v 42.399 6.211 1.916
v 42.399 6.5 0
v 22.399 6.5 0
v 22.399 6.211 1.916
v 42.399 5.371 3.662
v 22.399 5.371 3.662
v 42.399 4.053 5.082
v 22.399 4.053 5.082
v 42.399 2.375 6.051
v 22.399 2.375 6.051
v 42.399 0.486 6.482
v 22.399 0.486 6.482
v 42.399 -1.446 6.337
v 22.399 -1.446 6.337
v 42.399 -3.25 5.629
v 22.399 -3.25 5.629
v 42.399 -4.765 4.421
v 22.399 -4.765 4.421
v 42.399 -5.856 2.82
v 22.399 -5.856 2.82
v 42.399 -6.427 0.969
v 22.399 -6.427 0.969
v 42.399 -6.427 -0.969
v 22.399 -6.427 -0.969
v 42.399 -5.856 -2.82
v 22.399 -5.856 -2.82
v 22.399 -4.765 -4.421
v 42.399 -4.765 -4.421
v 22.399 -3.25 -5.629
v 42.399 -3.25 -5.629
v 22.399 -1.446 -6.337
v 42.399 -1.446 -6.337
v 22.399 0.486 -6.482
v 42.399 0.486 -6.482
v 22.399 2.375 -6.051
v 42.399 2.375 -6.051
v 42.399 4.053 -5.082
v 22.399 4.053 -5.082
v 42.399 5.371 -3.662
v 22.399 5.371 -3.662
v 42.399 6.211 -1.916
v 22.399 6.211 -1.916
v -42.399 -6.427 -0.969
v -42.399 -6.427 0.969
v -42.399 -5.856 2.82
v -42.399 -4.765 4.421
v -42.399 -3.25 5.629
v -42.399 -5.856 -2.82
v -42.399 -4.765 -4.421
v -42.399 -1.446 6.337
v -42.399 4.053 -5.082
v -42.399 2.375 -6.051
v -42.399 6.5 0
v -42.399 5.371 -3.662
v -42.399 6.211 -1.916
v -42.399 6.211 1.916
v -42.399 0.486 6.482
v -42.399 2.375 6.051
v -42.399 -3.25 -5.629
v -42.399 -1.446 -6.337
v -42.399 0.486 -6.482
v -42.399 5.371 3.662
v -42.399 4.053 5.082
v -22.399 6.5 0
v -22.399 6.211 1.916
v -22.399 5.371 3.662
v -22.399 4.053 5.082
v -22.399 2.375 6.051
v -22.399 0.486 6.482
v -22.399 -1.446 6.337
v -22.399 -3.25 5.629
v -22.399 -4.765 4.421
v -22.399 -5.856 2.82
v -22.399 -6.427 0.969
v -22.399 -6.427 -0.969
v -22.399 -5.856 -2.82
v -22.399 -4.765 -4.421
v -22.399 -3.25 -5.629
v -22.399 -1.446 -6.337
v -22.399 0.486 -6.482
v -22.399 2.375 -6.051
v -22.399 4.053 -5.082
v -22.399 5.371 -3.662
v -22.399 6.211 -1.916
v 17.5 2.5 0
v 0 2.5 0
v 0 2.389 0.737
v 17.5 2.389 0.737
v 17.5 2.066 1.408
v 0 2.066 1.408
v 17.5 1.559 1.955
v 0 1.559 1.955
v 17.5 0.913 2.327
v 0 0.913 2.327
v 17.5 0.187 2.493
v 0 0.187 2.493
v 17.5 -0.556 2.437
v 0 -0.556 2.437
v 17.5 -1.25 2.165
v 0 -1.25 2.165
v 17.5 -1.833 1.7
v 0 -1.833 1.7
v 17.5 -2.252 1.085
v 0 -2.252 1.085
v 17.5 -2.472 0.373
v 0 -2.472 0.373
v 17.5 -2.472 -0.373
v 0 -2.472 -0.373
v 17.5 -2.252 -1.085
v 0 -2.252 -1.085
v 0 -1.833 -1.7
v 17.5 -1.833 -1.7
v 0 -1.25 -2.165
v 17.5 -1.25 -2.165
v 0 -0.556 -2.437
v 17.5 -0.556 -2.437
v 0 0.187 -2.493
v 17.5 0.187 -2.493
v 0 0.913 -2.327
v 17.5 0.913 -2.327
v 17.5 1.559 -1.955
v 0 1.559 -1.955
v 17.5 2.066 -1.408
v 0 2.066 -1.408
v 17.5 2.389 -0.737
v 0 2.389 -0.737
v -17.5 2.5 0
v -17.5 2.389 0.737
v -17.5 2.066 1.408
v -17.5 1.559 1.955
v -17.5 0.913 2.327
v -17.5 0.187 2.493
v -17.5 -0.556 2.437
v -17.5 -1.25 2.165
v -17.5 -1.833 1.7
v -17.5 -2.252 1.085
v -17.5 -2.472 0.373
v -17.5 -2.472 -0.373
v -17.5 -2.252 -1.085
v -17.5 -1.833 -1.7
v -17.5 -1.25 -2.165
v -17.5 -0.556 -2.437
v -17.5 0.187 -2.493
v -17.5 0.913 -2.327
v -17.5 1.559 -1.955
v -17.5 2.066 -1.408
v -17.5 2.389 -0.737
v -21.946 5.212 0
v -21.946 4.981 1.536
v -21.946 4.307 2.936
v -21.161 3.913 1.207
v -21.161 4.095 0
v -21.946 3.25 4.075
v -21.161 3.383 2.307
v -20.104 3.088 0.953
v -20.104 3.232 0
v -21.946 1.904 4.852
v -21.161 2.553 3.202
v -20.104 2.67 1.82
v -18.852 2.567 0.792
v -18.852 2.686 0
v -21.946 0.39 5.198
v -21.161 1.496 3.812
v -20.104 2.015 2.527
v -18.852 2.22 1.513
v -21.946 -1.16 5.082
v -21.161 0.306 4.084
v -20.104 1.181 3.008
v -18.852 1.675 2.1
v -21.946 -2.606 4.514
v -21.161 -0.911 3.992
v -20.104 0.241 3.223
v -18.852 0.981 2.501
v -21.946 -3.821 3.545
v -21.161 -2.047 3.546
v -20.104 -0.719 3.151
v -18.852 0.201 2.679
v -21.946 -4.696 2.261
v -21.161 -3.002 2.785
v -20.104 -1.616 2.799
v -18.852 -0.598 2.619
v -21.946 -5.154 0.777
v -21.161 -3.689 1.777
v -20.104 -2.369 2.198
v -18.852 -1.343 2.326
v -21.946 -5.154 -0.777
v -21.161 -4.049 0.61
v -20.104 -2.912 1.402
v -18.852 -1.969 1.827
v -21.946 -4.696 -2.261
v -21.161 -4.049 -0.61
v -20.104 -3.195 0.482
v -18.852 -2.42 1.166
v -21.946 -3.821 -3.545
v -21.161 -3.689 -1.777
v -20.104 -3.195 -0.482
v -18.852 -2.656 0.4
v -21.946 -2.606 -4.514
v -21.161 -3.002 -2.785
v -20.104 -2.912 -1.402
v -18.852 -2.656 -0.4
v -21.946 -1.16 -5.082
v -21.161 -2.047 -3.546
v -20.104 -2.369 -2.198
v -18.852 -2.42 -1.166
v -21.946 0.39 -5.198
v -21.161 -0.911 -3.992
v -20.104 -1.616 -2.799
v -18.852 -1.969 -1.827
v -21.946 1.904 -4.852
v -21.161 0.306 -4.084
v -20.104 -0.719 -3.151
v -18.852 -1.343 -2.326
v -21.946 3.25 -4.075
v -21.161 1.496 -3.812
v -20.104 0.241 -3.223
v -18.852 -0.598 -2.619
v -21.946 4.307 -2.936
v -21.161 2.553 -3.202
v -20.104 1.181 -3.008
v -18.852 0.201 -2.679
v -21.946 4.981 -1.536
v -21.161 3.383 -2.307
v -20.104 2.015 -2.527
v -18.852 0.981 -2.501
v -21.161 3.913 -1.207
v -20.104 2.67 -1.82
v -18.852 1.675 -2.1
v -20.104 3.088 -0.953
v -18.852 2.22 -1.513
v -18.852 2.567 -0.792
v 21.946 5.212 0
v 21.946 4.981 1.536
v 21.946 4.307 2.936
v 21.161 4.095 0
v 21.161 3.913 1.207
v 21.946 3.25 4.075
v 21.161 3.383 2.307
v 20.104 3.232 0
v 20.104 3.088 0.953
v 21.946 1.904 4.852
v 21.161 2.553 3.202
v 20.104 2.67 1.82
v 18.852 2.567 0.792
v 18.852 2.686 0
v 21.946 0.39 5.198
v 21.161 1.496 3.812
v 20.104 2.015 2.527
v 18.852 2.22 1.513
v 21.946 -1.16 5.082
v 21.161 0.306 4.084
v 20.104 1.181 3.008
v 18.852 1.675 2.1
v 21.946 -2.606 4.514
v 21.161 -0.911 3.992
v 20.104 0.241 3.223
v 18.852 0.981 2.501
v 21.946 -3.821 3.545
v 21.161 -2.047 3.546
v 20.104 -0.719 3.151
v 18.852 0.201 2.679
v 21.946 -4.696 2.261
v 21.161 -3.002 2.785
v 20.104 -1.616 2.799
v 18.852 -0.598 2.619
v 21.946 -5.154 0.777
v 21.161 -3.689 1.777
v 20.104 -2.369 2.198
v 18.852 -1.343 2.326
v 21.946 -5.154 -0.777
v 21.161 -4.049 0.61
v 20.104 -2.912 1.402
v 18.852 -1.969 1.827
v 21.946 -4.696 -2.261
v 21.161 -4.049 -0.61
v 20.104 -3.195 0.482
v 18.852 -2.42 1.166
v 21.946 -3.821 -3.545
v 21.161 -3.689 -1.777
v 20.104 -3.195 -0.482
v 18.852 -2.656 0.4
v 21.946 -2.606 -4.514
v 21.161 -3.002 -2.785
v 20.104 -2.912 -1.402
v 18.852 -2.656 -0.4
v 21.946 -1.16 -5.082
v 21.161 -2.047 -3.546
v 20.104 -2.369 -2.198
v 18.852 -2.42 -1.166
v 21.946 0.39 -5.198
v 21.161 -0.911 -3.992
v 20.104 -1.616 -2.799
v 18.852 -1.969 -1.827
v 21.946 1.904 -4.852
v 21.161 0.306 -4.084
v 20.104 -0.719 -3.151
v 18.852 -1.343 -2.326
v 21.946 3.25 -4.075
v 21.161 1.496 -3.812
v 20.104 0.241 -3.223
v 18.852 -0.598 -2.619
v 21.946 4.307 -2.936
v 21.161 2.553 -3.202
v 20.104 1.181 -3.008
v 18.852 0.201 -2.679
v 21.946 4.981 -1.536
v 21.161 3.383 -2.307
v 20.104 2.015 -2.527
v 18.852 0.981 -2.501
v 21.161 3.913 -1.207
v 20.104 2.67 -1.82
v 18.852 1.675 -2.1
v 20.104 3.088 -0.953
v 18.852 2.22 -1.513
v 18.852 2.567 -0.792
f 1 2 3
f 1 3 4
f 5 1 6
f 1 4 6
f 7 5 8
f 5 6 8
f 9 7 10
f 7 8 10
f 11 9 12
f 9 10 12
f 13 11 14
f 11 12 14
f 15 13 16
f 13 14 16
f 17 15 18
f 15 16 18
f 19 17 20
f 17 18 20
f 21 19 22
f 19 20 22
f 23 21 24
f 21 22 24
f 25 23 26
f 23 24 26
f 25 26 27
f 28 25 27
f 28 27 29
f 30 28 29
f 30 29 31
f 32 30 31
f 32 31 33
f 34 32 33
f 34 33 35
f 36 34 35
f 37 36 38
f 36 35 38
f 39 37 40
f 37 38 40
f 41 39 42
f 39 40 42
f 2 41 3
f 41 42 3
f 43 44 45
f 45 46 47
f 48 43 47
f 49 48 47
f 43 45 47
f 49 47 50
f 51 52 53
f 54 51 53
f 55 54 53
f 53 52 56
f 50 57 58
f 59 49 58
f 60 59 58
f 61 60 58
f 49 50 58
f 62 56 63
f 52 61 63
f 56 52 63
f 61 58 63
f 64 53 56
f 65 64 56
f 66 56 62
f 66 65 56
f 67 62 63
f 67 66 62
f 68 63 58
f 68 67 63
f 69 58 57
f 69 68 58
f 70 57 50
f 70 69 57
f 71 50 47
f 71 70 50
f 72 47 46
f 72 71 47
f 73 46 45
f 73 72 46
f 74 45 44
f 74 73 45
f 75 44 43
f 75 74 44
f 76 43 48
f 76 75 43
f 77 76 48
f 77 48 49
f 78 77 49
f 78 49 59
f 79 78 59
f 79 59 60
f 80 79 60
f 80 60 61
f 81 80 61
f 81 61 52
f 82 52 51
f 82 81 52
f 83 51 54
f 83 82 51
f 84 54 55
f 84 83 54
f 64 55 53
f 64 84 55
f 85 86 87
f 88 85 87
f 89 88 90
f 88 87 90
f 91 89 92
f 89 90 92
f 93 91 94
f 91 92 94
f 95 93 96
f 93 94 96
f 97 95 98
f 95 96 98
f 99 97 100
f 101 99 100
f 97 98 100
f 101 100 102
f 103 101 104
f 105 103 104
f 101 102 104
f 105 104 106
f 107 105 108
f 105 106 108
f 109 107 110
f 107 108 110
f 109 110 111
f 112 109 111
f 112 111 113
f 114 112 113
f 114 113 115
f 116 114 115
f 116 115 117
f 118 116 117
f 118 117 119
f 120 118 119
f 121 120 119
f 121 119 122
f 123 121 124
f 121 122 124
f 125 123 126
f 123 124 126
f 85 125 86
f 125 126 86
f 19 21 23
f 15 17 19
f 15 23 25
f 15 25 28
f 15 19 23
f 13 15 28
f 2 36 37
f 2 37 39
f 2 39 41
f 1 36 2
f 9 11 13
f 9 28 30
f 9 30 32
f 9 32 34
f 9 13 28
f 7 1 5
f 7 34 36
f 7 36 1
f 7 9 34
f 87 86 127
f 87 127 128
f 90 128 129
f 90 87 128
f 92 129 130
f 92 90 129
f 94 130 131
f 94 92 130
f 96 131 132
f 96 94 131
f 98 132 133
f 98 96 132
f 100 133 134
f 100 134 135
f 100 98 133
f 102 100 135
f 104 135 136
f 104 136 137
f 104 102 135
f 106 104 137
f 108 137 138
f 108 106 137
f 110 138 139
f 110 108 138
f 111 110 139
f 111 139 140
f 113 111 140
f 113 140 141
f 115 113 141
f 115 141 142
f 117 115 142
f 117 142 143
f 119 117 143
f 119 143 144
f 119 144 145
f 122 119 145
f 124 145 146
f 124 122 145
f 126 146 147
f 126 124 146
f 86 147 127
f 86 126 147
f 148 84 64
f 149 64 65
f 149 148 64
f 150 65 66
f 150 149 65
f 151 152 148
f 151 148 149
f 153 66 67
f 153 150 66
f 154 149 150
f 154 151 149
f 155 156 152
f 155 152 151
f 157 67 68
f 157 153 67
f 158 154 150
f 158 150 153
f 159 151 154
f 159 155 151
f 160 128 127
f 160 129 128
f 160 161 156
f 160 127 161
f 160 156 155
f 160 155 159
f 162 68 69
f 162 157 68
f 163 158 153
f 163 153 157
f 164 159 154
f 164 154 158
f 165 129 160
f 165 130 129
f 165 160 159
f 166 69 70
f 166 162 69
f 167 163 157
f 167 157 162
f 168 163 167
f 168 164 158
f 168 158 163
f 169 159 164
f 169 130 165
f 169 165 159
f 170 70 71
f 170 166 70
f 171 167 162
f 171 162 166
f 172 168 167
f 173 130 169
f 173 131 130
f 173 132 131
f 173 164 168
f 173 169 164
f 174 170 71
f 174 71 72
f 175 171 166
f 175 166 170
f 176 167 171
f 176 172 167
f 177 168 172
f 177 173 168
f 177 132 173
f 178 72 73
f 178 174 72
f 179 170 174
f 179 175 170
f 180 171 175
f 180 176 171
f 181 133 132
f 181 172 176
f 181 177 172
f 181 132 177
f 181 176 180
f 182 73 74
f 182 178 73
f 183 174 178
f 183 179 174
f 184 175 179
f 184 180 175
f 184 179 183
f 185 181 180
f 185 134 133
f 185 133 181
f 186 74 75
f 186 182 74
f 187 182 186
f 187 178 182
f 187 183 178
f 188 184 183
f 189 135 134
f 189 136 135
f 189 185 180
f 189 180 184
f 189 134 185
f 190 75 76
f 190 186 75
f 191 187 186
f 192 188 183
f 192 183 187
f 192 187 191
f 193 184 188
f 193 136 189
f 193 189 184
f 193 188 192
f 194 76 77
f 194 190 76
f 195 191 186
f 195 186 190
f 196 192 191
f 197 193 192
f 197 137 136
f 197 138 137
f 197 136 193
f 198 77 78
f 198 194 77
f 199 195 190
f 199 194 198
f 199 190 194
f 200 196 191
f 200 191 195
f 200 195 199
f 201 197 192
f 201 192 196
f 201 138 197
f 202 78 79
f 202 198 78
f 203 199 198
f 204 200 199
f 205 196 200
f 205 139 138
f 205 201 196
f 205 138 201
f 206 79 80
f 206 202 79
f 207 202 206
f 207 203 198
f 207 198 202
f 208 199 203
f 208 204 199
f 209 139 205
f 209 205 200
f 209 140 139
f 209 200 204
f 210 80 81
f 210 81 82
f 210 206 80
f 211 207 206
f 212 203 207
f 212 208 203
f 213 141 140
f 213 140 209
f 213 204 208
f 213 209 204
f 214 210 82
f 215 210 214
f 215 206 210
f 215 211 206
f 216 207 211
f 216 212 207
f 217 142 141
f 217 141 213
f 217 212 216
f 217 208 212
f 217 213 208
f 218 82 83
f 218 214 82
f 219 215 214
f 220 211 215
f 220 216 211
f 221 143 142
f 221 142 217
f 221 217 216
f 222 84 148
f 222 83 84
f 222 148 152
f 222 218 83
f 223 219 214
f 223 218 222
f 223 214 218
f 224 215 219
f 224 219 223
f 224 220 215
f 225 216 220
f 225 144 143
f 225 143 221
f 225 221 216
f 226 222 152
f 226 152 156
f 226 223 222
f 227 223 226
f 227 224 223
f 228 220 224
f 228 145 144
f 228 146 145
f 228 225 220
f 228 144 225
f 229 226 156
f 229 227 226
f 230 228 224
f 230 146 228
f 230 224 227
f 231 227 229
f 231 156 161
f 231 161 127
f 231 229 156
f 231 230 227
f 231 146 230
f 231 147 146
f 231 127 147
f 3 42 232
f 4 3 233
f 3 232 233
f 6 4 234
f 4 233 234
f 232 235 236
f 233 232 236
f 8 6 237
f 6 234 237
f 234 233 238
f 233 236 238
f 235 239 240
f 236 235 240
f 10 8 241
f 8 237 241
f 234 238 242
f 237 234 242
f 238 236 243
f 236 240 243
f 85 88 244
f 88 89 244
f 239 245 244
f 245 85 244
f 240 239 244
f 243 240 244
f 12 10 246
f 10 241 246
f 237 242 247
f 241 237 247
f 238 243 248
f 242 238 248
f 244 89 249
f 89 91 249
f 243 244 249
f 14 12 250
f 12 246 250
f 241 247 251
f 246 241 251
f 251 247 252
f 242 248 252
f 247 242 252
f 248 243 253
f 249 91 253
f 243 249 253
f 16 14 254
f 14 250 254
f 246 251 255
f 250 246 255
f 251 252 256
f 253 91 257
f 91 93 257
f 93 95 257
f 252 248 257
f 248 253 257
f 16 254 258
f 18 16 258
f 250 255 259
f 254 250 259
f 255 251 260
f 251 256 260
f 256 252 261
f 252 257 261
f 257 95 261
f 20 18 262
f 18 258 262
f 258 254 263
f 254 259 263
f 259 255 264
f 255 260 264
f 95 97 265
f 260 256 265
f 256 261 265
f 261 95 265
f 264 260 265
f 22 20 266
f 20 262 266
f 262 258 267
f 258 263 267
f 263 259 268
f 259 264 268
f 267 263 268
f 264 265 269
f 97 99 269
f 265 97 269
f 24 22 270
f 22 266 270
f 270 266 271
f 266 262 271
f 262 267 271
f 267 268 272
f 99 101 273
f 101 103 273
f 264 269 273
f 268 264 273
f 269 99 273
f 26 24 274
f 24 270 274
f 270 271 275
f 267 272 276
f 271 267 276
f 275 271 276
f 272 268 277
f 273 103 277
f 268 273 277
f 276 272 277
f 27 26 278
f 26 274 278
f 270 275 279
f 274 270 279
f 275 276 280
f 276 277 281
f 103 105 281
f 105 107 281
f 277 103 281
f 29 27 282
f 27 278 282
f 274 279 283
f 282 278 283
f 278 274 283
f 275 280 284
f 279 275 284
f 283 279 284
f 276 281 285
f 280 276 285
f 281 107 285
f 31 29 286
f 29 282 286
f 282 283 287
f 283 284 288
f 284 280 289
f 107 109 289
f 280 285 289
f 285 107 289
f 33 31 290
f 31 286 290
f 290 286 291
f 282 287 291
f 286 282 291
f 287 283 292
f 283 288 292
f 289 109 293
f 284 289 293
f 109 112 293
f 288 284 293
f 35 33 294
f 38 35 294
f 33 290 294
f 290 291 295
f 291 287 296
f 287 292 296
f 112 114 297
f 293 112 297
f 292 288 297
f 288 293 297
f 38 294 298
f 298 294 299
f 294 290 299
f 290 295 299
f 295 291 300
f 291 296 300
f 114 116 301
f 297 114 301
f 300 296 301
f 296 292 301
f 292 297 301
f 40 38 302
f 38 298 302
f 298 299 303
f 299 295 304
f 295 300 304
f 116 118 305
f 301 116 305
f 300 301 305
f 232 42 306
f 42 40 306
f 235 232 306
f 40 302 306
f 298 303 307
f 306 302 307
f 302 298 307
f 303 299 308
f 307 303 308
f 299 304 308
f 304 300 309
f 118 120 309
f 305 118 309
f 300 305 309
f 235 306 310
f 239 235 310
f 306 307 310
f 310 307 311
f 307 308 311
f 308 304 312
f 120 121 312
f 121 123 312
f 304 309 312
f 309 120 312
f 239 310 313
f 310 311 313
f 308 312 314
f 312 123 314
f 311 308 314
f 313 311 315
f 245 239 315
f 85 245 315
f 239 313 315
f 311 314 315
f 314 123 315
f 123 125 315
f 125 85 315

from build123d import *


with BuildPart() as part:
    # Sketch → Revolution (revolve)
    with BuildSketch(Plane.XY):
        with BuildLine():
            Line((-42.398979, 6.5), (-42.398979, 0))
            Line((0, 0), (-42.398979, 0))
            Line((0, 2.5), (0, 0))
            Line((-17.5, 2.5), (0, 2.5))
            ThreePointArc((-22.398979, 6.5), (-20.662278, 3.627017), (-17.5, 2.5))
            Line((-42.398979, 6.5), (-22.398979, 6.5))
        make_face()
    revolution = revolve(axis=Axis((0, 0, 0), (1, 0, 0)))

    # Mirrored: Revolution across Sketch V_Axis
    add(revolution.mirror(Plane(origin=(0, 0, 0), x_dir=(0, 0, 1), z_dir=(1, 0, 0))))


solid = part.part
